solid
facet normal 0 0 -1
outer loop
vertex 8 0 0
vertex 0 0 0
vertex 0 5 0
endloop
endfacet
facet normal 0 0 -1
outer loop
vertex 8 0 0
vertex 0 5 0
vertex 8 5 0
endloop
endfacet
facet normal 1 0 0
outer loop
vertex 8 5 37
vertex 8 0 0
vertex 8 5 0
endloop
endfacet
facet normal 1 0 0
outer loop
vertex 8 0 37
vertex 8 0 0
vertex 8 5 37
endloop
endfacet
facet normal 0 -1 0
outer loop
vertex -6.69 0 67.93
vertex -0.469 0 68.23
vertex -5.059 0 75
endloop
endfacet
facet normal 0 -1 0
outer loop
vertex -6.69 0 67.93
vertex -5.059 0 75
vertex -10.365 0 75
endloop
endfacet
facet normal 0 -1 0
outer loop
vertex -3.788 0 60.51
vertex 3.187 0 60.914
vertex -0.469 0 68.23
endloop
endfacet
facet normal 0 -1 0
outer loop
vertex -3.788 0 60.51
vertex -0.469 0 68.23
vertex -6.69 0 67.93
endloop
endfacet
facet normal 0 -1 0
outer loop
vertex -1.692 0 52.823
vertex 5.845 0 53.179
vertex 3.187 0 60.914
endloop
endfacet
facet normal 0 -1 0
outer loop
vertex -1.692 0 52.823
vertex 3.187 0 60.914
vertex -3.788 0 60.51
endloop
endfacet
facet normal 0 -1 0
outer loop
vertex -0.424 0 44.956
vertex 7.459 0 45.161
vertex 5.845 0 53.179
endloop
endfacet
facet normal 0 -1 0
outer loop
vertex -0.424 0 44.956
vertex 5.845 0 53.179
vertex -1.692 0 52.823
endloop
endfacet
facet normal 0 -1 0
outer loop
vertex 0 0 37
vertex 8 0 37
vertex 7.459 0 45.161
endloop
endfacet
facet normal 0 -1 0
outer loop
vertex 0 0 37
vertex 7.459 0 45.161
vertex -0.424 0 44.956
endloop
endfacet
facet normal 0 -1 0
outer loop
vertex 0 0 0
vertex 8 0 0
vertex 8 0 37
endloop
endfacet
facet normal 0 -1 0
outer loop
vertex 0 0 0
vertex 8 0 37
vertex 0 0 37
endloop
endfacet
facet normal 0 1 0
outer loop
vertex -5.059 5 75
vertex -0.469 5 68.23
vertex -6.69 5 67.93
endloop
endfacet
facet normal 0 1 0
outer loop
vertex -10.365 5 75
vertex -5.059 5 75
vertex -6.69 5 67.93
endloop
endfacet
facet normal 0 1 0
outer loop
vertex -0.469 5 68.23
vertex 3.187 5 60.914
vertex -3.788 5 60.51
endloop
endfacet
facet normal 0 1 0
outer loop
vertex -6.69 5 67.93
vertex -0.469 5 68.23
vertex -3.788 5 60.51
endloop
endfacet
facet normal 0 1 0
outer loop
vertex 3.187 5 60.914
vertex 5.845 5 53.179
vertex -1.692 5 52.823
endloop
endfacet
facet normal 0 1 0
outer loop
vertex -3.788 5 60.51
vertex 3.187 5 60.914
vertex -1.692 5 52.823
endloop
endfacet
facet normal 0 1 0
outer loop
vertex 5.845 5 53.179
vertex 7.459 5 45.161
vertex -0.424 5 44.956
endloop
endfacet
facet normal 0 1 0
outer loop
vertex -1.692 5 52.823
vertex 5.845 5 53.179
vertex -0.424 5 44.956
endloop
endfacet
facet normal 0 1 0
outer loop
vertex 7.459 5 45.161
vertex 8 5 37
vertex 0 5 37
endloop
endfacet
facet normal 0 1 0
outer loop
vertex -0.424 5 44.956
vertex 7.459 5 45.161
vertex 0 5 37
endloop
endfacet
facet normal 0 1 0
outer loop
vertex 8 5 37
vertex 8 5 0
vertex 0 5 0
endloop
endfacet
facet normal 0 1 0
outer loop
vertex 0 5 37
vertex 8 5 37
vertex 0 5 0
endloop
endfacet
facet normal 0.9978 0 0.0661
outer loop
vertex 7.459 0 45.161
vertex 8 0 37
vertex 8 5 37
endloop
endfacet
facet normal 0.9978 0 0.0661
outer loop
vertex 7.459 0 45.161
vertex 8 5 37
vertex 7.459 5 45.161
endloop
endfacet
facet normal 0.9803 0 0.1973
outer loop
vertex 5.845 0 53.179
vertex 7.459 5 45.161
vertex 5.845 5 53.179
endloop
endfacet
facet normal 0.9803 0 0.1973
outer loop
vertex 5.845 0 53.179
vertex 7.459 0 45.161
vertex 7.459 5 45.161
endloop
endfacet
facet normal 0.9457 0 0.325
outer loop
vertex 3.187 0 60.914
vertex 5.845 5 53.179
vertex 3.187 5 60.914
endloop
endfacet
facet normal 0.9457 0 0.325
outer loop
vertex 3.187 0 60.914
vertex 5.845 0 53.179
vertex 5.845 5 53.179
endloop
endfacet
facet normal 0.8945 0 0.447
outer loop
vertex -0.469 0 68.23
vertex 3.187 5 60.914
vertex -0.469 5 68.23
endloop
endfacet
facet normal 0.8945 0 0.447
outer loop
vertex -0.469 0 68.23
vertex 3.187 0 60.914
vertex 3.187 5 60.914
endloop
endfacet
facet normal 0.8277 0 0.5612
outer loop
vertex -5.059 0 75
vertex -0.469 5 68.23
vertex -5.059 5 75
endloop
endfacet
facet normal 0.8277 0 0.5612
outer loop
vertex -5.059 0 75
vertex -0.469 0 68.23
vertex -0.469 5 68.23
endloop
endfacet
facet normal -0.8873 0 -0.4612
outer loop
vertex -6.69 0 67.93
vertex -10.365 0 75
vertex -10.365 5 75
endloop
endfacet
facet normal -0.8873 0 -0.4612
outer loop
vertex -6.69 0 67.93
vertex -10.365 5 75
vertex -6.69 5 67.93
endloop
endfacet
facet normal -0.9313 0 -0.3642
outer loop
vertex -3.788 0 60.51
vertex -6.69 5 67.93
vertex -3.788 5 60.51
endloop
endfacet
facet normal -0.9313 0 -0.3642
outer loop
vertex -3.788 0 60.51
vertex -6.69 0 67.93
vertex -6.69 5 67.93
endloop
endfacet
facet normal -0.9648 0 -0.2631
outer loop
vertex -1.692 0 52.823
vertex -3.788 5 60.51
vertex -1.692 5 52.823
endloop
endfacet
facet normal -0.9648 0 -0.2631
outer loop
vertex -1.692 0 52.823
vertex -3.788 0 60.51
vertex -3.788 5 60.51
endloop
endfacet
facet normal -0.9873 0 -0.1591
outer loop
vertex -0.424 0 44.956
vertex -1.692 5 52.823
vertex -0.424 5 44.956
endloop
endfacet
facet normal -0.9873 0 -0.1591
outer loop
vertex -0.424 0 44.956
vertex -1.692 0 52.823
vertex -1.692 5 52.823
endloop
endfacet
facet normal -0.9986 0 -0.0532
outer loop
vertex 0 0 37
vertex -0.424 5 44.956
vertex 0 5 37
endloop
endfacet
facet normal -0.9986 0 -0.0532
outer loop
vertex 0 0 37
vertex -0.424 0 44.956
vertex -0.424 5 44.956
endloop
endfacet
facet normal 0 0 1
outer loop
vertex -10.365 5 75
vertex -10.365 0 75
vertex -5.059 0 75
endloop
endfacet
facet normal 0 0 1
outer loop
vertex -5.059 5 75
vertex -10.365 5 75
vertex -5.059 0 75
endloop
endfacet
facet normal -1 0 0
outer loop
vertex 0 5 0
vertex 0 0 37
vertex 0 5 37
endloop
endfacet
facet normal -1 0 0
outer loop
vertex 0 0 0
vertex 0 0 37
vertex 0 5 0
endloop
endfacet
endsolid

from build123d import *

# Parameters (mm, degrees)
BOSS_EXTRUDE1_DEPTH = 5
CUT_EXTRUDE1_START  = -10
CUT_EXTRUDE1_DEPTH  = 10


with BuildPart() as part:
    # Sketch1 → Boss-Extrude1 (new body)
    with BuildSketch(Plane(origin=(0, 0, 0), x_dir=(1, 0, 0), z_dir=(0, 1, 0))):
        with BuildLine():
            Line((0, 0), (8, 0))
            Line((8, 0), (8, -37))
            ThreePointArc((8, -37), (-0.020288742, -67.450779957), (-22, -90))
            ThreePointArc((-22, -90), (-5.718469366, -65.692333471), (0, -37))
            Line((0, -37), (0, -8))
            Line((0, -8), (0, 0))
        make_face()
    extrude(amount=BOSS_EXTRUDE1_DEPTH)

    # Sketch2 → Cut-Extrude1 (cut)
    with BuildSketch(Plane(origin=(0, 5, 0), x_dir=(1, 0, 0), z_dir=(0, 1, 0)).offset(CUT_EXTRUDE1_START)):
        with BuildLine():
            Line((-10.364854051, -75), (-5.059100302, -75))
            ThreePointArc((-5.059100302, -75), (-12.837382179, -83.28172988), (-22, -90))
            ThreePointArc((-22, -90), (-15.704900448, -82.870406095), (-10.364854051, -75))
        make_face()
    extrude(amount=CUT_EXTRUDE1_DEPTH, mode=Mode.SUBTRACT)


solid = part.part
